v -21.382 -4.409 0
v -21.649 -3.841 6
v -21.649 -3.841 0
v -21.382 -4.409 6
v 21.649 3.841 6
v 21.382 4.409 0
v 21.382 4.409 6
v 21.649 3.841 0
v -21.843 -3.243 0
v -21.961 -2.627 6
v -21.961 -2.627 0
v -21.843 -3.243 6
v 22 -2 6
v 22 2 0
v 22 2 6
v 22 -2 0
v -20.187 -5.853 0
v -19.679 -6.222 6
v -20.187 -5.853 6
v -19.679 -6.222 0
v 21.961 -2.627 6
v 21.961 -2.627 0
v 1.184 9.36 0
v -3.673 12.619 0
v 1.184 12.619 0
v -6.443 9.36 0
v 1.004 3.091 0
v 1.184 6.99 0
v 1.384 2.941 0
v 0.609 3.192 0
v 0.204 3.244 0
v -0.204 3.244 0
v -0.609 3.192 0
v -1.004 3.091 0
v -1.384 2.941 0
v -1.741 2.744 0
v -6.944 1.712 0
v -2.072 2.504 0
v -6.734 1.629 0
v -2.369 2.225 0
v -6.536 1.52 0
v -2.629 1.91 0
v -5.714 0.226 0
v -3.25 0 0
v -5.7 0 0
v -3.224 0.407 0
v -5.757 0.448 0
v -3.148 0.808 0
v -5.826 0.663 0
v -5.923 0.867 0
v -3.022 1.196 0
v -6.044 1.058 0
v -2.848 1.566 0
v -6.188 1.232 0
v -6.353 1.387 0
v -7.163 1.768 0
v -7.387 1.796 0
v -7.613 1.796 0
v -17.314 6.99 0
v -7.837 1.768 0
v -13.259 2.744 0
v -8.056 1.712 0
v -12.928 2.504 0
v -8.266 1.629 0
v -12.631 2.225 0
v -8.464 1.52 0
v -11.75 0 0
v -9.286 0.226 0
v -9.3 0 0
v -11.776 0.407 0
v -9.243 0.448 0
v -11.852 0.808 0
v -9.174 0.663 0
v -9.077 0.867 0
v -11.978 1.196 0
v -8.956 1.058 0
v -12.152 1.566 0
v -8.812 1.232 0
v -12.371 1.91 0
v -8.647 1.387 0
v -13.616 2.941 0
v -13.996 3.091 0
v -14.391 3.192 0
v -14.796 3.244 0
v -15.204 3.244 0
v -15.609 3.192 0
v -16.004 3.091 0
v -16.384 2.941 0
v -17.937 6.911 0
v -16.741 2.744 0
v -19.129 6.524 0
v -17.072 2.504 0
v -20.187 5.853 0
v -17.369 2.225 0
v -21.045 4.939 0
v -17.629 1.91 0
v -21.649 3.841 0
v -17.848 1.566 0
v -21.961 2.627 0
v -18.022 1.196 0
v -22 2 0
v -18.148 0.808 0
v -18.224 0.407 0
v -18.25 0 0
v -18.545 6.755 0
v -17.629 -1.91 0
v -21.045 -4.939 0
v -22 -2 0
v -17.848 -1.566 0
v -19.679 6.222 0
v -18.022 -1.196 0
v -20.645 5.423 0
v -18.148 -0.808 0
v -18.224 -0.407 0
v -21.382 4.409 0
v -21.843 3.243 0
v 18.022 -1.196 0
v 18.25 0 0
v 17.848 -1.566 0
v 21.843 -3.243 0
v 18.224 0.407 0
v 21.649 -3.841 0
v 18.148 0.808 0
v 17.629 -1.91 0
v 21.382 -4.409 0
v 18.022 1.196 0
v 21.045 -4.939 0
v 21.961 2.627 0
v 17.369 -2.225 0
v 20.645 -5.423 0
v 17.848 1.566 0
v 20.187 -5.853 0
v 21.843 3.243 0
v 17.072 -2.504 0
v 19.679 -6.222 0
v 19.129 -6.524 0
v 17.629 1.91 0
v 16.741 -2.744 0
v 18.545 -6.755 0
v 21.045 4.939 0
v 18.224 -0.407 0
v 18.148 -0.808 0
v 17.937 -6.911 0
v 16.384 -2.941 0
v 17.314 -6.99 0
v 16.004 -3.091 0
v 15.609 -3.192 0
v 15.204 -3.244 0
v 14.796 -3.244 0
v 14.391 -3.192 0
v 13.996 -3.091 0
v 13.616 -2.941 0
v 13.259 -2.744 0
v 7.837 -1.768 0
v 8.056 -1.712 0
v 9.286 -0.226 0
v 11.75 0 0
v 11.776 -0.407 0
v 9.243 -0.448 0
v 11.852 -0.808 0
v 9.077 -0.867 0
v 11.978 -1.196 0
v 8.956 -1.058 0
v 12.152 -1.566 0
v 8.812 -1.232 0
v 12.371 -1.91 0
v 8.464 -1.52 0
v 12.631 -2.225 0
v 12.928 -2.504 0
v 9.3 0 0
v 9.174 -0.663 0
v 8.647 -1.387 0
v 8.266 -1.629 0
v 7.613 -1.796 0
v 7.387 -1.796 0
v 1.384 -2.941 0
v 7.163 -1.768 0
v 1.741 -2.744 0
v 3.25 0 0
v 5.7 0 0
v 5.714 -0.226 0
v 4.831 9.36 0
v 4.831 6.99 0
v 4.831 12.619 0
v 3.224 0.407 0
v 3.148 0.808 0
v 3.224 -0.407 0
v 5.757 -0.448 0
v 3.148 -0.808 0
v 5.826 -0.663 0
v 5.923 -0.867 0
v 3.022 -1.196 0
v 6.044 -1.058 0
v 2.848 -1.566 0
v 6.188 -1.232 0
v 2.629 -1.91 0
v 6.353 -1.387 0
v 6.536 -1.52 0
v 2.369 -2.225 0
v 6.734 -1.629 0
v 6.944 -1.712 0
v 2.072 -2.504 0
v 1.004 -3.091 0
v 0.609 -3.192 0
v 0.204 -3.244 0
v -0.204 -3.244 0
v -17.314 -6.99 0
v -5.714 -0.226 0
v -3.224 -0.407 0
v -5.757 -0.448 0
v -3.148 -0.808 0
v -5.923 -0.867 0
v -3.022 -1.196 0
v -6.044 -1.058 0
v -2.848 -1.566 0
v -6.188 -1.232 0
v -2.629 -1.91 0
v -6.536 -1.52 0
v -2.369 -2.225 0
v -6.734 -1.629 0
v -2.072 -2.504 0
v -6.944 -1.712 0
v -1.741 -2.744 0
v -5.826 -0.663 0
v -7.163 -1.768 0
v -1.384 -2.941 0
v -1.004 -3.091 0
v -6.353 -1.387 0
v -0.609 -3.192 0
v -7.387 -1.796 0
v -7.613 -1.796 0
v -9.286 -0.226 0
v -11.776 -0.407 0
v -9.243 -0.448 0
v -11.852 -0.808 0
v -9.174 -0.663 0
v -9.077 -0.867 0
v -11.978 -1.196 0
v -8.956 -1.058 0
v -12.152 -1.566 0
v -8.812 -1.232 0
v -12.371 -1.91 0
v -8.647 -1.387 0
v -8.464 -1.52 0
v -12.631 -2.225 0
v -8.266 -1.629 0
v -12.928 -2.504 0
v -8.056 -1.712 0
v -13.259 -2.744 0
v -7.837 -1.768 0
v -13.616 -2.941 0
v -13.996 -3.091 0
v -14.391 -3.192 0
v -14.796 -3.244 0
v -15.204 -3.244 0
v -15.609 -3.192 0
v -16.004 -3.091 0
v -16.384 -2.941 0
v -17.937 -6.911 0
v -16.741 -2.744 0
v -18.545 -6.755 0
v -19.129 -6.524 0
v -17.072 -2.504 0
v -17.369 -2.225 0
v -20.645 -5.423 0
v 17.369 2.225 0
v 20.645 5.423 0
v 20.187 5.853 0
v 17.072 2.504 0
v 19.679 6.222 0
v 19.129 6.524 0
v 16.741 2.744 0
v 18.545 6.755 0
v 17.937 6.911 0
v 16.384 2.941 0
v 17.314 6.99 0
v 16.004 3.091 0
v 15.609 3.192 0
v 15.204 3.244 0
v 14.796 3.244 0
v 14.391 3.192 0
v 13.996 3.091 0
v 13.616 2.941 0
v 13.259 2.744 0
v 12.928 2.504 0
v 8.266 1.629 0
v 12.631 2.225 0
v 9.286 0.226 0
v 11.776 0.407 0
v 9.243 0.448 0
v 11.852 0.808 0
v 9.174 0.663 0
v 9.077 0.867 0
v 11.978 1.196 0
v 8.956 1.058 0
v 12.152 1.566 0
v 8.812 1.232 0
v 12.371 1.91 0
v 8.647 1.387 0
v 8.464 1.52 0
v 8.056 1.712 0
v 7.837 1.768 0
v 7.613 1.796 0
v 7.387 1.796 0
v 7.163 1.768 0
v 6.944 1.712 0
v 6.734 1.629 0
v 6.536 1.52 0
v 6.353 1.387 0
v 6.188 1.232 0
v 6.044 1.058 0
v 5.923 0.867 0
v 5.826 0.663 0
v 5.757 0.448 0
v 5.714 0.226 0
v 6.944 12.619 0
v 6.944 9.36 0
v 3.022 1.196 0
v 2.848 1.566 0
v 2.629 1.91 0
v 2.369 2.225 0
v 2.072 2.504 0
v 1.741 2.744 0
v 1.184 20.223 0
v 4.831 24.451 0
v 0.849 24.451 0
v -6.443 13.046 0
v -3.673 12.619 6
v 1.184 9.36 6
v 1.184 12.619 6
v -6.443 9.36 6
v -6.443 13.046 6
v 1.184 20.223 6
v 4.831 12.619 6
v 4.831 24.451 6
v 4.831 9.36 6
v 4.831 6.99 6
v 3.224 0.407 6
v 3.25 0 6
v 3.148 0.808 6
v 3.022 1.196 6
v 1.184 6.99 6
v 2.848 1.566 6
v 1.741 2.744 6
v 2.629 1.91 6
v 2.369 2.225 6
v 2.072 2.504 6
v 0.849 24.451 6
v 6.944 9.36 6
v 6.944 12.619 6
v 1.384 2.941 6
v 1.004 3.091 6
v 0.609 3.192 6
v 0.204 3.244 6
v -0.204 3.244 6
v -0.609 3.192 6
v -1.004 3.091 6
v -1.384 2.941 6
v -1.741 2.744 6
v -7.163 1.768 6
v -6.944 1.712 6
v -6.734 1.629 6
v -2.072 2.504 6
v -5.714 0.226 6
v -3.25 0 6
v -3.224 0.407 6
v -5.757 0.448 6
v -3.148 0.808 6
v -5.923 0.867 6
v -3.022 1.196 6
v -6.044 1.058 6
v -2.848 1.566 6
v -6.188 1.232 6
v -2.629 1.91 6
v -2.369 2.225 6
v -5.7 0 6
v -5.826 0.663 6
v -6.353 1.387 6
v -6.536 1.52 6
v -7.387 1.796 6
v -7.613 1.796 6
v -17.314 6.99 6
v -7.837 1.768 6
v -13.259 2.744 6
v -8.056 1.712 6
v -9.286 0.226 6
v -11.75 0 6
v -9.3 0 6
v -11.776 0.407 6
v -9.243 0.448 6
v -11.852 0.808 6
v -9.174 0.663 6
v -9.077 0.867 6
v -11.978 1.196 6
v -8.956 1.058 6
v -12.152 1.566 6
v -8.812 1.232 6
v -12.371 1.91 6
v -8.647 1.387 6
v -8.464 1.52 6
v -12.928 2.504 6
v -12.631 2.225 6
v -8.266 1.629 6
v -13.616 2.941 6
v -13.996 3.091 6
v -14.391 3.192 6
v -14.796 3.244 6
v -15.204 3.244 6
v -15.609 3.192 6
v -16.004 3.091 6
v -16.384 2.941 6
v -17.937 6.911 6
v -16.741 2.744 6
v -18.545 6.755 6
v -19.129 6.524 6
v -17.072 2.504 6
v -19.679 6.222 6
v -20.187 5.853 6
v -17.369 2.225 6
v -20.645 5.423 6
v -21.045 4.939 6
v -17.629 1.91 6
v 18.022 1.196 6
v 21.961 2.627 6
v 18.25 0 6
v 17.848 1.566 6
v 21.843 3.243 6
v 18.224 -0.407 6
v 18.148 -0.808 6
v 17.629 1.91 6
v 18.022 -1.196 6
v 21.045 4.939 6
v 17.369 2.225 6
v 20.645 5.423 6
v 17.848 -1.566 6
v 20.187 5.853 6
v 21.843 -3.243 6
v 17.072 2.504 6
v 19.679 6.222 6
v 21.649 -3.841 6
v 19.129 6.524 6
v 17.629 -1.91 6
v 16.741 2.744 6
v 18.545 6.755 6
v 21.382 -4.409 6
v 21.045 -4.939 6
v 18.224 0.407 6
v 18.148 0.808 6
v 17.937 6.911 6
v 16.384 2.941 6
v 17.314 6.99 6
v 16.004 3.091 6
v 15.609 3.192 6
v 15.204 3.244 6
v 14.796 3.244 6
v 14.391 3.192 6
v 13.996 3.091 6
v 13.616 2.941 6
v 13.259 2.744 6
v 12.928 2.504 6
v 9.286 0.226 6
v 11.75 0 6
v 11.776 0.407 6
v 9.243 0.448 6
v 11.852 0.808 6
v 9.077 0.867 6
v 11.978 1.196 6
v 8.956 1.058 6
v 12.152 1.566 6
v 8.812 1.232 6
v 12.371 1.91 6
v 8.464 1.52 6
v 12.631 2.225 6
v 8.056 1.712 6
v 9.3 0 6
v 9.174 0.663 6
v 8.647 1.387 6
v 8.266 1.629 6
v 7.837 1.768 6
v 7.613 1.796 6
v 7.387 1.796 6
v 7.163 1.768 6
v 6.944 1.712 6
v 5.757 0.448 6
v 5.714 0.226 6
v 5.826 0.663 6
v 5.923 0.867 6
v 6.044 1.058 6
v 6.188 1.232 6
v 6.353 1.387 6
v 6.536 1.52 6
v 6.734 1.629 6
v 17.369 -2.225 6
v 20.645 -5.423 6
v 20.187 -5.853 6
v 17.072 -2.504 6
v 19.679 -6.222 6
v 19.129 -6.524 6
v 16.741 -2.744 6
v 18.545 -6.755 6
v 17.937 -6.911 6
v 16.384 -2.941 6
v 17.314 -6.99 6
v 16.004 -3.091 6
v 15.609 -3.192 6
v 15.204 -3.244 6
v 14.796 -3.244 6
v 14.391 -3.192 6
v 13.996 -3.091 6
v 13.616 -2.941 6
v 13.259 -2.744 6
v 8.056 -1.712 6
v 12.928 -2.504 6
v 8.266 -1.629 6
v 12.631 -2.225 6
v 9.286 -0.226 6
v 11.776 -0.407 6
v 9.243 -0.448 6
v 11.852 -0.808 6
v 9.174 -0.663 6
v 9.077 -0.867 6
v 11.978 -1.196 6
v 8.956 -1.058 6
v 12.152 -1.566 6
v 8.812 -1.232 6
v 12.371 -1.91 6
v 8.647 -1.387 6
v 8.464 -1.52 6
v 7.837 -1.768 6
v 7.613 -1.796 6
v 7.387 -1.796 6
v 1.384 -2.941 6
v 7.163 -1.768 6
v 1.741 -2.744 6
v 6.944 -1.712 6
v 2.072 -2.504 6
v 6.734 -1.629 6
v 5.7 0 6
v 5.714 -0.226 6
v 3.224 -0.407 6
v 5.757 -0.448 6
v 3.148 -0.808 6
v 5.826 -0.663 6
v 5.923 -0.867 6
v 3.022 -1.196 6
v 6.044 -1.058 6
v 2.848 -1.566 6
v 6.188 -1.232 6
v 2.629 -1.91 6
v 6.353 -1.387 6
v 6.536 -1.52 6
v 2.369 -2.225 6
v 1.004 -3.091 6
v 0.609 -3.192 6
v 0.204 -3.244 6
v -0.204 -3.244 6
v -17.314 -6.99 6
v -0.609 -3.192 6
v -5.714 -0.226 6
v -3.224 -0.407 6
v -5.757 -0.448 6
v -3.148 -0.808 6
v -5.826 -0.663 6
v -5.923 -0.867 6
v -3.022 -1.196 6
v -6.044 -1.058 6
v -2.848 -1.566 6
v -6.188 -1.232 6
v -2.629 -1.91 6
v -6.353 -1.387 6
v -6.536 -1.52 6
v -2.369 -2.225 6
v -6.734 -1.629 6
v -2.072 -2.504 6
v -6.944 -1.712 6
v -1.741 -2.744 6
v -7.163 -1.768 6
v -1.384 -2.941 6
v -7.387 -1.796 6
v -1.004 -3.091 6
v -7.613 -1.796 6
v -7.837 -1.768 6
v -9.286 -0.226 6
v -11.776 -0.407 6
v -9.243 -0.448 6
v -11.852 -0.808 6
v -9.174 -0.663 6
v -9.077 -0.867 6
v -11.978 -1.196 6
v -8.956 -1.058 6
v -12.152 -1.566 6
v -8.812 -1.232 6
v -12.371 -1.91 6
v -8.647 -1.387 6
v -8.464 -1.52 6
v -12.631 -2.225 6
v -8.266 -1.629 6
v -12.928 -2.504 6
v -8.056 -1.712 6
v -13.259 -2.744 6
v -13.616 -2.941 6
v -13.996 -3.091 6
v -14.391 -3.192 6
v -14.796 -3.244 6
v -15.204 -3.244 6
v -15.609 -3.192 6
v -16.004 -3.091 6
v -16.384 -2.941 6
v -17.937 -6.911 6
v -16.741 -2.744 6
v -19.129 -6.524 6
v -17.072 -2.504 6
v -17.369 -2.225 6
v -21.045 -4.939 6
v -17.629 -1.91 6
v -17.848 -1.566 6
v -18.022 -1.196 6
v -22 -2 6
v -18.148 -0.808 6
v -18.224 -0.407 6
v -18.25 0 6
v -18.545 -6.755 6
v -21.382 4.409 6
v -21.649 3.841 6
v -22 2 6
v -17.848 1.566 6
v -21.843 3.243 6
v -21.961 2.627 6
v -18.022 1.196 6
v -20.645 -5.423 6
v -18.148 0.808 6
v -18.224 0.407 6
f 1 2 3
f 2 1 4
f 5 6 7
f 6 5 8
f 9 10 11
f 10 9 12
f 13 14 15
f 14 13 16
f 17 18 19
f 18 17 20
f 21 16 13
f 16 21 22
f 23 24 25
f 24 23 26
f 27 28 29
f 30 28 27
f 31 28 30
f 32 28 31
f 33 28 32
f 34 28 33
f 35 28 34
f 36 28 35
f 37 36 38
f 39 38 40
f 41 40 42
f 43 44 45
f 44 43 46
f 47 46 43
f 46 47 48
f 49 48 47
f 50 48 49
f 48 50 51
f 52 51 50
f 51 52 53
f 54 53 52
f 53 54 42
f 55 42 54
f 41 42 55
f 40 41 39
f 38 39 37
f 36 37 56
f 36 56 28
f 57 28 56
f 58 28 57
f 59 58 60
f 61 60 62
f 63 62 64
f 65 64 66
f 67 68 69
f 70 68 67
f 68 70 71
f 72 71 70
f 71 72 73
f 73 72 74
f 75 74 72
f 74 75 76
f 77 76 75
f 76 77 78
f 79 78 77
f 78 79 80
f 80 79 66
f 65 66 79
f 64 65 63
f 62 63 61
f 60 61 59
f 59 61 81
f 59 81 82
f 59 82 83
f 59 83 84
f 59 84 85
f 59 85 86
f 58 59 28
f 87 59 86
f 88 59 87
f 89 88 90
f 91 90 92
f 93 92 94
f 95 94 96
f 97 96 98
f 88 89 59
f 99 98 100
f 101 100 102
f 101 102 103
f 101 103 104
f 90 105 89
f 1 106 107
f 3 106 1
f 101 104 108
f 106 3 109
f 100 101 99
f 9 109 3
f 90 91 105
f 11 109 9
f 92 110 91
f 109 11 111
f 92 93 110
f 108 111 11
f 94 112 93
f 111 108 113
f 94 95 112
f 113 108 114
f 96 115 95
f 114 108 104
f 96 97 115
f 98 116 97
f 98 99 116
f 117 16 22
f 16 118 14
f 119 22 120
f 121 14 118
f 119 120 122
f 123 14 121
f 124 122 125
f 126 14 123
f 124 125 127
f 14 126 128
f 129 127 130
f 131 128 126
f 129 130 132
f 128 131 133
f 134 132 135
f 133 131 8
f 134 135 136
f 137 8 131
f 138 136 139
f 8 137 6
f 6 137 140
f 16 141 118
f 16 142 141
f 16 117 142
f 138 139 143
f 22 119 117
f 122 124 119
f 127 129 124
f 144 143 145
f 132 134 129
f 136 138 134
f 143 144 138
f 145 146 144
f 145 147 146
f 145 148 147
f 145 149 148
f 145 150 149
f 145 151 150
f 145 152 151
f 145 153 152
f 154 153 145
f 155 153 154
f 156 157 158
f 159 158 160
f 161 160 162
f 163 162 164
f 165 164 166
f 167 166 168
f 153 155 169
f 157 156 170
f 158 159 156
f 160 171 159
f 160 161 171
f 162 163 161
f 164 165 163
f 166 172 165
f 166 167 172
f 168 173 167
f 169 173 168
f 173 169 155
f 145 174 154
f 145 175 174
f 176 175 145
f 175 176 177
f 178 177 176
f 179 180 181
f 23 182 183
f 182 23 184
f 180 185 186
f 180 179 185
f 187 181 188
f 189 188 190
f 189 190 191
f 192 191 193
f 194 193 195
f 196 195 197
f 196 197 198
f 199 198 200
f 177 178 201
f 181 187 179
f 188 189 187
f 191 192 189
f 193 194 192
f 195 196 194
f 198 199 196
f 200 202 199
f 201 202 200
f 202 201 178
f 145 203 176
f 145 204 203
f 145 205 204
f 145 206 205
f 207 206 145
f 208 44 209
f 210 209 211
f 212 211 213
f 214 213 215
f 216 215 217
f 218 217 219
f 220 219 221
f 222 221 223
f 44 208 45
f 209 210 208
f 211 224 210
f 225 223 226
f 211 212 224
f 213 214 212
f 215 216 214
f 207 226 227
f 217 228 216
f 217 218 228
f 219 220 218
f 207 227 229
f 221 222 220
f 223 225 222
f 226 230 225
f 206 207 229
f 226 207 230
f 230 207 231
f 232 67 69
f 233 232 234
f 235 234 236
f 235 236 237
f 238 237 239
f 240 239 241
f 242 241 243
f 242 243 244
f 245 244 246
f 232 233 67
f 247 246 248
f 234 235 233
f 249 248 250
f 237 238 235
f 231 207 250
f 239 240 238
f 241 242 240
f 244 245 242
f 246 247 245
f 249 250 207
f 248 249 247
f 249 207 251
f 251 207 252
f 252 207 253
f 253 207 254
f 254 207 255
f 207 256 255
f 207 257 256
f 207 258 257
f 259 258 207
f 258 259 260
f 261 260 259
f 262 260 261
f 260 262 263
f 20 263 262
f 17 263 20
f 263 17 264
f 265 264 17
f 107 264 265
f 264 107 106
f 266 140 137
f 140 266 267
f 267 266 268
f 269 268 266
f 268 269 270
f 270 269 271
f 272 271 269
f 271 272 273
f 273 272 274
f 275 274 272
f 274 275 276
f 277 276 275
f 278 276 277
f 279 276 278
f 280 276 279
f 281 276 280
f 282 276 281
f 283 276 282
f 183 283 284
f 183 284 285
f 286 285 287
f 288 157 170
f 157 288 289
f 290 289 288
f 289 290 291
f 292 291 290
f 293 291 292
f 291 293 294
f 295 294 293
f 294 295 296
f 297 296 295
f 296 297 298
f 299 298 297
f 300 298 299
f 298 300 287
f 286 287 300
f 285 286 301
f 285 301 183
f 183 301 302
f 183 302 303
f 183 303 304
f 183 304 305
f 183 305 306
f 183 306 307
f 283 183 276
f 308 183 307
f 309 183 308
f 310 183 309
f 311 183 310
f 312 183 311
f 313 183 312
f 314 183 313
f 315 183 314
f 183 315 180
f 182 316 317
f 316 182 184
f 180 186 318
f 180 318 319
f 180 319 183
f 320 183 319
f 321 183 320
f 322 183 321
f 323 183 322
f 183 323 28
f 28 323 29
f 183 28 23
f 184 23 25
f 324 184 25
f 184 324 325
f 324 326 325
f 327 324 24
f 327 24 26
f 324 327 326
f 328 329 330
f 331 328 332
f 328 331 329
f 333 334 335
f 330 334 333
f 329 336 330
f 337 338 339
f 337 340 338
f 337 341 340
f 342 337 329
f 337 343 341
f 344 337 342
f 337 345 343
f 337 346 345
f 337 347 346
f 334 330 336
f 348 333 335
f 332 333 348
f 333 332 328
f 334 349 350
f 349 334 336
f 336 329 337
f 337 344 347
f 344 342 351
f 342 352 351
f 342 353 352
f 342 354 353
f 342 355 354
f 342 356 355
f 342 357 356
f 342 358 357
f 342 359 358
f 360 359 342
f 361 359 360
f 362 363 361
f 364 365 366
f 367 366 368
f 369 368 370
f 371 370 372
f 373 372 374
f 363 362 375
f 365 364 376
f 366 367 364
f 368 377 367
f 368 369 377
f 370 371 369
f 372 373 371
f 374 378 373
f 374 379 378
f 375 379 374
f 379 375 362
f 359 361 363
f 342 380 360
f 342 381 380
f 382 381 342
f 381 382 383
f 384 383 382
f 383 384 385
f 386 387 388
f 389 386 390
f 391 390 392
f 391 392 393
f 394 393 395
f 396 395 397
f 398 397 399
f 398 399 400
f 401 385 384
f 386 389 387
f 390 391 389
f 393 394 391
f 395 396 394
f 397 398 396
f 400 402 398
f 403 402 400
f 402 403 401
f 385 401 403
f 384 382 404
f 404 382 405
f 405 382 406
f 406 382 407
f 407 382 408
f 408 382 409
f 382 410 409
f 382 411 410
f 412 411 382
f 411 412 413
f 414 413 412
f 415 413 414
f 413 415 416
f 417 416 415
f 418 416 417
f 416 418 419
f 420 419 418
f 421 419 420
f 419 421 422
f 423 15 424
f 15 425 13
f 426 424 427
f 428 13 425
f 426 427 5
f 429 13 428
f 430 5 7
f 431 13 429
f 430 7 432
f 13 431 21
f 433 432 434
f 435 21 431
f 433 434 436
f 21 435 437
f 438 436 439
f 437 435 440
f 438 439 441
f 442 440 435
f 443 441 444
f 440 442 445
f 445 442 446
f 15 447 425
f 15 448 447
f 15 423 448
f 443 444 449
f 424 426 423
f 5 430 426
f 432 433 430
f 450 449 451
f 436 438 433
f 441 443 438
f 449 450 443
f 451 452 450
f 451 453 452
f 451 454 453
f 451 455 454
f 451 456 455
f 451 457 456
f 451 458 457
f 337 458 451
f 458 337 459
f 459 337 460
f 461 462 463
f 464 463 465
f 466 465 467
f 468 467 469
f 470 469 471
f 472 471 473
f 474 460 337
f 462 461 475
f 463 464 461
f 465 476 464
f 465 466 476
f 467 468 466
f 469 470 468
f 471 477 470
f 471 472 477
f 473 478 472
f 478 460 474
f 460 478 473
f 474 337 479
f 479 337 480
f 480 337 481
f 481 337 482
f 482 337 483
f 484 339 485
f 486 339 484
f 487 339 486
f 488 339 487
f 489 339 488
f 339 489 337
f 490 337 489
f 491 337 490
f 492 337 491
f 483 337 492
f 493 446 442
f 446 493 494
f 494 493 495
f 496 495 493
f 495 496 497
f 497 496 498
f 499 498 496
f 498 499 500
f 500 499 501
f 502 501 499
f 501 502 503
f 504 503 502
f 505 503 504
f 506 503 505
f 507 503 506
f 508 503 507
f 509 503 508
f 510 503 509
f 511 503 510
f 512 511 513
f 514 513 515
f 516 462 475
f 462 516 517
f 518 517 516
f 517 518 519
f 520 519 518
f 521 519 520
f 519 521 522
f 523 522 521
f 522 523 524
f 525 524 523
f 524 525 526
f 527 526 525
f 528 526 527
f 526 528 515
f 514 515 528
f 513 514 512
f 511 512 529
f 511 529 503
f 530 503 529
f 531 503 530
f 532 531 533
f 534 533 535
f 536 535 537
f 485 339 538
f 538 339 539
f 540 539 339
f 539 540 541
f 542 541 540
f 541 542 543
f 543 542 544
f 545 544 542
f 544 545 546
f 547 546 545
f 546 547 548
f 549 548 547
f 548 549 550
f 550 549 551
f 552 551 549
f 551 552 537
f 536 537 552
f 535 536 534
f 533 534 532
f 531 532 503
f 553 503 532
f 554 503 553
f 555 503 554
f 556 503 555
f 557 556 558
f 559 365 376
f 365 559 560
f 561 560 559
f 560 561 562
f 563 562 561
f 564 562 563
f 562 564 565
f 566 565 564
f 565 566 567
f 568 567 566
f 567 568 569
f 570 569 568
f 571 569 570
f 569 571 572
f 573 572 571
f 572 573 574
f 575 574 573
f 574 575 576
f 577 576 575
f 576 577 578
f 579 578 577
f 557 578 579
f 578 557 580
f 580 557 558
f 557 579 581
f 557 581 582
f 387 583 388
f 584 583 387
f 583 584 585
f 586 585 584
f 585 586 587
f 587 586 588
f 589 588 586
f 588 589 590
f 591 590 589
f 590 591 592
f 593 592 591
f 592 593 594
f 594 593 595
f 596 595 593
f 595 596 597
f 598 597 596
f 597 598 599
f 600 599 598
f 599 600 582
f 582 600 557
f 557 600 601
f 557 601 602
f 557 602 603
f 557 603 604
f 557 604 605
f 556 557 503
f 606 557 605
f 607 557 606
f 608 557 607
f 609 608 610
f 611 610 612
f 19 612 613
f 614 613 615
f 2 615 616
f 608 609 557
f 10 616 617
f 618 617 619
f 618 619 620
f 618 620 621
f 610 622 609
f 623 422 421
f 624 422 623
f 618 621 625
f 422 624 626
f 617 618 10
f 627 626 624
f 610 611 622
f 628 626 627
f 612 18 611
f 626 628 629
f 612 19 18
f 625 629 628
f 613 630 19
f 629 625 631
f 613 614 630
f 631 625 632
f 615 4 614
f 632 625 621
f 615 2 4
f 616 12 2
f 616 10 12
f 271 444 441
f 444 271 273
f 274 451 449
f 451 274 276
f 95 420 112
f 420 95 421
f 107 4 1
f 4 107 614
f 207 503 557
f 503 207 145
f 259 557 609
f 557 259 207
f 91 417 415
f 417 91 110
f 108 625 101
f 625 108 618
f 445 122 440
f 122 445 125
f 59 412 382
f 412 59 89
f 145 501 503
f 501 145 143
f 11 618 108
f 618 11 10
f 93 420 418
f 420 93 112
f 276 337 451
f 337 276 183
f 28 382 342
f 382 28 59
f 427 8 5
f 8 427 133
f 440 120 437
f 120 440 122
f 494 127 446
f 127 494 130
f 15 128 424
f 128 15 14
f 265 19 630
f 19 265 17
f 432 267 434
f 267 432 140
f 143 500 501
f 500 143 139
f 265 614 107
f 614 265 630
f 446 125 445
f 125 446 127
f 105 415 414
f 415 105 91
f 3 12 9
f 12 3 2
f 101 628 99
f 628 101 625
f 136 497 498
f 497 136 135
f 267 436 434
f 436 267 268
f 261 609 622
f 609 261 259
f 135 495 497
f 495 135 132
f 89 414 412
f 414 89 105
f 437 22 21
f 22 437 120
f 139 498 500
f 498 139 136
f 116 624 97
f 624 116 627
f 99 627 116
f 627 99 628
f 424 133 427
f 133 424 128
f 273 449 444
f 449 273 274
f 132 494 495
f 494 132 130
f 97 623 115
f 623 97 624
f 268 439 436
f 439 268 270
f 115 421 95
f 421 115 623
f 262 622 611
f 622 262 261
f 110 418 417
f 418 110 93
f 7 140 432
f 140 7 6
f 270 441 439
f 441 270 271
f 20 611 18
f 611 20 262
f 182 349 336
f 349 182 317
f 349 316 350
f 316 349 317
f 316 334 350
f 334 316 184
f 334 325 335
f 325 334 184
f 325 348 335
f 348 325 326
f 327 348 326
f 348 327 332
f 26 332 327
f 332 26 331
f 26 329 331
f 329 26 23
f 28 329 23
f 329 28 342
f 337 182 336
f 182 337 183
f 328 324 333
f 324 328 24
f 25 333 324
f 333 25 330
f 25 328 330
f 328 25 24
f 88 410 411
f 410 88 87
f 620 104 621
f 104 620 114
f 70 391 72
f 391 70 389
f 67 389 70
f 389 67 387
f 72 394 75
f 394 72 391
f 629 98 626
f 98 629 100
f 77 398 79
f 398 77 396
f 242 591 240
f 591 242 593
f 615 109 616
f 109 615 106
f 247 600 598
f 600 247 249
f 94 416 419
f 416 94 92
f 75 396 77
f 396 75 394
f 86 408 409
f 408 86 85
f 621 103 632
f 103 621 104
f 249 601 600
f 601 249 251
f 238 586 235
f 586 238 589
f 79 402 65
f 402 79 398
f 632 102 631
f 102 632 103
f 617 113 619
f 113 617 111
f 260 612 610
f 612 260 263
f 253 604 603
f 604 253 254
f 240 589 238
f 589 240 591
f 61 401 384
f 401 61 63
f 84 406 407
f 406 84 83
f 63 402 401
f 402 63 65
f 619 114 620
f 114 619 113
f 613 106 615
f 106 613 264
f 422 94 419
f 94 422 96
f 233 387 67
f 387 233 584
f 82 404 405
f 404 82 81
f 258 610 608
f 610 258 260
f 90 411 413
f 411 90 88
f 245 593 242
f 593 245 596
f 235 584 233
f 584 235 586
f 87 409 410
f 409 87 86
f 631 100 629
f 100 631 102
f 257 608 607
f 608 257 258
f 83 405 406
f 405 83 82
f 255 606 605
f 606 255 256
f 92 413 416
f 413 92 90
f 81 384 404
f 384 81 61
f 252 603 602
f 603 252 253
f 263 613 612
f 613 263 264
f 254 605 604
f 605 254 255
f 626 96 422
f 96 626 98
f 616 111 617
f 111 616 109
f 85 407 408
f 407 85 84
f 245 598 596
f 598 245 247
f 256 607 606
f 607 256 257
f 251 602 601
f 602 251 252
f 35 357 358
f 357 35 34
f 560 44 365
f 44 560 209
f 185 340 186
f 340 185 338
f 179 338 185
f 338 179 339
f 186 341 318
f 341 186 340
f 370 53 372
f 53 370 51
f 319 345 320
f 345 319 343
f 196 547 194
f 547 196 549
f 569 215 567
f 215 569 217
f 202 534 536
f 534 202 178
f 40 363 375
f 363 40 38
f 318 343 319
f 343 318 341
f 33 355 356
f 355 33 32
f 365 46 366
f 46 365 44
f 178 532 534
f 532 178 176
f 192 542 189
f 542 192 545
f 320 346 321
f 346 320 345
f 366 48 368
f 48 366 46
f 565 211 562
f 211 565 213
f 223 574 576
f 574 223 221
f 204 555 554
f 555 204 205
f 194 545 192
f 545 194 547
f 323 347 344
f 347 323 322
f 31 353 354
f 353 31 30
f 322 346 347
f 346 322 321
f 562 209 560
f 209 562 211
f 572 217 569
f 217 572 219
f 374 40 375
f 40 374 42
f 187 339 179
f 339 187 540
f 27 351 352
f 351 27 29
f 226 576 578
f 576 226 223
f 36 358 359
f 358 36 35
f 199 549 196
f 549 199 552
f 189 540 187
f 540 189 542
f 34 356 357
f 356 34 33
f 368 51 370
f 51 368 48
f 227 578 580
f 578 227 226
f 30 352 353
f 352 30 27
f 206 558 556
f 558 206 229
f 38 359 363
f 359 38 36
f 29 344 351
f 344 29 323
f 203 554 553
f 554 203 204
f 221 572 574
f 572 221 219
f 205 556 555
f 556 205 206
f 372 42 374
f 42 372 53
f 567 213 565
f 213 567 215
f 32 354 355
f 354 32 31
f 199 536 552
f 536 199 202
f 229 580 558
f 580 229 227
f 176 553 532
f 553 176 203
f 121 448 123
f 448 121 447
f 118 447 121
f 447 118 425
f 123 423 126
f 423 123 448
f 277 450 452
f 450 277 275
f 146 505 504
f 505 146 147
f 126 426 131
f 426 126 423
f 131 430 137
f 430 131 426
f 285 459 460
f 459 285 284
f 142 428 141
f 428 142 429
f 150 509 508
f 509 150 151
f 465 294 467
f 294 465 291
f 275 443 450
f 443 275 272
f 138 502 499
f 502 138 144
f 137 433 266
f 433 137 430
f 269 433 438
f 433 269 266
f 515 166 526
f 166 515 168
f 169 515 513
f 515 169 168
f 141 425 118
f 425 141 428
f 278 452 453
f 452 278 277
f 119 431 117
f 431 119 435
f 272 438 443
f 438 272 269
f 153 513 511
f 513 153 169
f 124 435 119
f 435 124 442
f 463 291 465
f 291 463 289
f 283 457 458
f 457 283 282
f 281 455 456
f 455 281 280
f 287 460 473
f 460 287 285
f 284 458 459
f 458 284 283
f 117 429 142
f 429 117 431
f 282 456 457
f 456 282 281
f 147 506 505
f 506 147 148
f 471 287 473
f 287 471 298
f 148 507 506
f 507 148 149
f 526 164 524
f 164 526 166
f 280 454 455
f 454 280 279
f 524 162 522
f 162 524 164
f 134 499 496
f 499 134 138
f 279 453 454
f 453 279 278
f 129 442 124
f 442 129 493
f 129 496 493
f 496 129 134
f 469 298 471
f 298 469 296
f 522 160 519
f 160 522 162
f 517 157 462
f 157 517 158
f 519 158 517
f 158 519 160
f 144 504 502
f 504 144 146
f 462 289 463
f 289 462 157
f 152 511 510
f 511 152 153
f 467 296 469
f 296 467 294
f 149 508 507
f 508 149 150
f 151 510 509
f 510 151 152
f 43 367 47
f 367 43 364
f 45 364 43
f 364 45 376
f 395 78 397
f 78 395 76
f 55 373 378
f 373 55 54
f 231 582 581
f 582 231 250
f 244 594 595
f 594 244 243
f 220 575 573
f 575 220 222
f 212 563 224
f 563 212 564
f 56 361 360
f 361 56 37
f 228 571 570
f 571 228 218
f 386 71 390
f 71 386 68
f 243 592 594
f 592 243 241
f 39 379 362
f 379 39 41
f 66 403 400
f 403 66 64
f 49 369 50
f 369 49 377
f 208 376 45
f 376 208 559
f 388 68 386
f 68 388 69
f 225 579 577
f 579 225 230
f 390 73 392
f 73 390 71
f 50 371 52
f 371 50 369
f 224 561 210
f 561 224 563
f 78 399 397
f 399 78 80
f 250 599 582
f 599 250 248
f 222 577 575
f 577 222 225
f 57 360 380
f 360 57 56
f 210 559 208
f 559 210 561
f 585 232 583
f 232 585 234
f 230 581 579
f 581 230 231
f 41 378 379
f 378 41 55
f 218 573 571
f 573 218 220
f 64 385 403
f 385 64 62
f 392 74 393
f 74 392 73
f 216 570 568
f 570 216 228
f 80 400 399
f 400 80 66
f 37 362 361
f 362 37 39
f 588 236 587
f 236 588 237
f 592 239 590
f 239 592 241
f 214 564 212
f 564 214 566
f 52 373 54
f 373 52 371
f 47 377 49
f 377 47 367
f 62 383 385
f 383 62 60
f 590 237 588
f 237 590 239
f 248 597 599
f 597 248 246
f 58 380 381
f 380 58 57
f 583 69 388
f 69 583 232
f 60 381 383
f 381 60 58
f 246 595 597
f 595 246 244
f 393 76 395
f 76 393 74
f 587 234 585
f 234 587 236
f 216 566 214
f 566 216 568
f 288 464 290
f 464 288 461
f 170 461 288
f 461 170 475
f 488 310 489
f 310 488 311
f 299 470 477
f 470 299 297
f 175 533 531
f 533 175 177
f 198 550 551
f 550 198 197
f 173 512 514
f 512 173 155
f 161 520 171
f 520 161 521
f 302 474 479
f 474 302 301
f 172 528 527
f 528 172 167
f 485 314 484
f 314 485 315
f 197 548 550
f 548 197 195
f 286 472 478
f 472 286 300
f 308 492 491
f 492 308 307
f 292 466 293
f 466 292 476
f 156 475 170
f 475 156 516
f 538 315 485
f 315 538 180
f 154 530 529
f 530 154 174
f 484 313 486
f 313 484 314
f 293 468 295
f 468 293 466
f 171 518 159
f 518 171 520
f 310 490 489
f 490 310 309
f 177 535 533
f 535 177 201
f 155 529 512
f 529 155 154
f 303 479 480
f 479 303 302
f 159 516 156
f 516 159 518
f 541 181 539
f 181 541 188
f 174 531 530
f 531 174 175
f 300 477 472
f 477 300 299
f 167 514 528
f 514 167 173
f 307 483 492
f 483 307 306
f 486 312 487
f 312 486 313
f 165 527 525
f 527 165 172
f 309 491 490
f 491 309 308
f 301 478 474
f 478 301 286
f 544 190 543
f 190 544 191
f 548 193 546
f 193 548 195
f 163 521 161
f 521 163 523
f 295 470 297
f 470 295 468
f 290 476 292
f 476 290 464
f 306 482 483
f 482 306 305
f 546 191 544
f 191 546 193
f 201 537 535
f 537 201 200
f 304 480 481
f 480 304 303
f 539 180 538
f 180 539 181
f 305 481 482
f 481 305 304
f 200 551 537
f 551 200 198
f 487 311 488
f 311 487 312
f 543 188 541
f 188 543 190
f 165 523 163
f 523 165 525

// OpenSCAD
$fn = 50;


difference() {
	union() {
		hull() {
			translate(v = [-17.0000000000, 2.0000000000, 0]) {
				cylinder(h = 6, r = 5);
			}
			translate(v = [17.0000000000, 2.0000000000, 0]) {
				cylinder(h = 6, r = 5);
			}
			translate(v = [-17.0000000000, -2.0000000000, 0]) {
				cylinder(h = 6, r = 5);
			}
			translate(v = [17.0000000000, -2.0000000000, 0]) {
				cylinder(h = 6, r = 5);
			}
		}
		translate(v = [0, 24, 0]) {
			linear_extrude(height = 6) {
				text(font = "DejaVu Sans Mono:style=Bold", halign = "center", size = 19.0000000000, text = "4", valign = "top");
			}
		}
	}
	union() {
		translate(v = [-15.0000000000, 0.0000000000, 0]) {
			translate(v = [0, 0, -100]) {
				cylinder(h = 200, r = 3.2500000000);
			}
		}
		translate(v = [0, 0, -100]) {
			cylinder(h = 200, r = 3.2500000000);
		}
		translate(v = [15.0000000000, 0.0000000000, 0]) {
			translate(v = [0, 0, -100]) {
				cylinder(h = 200, r = 3.2500000000);
			}
		}
		translate(v = [-15.0000000000, 0.0000000000, 0]) {
			translate(v = [0, 0, -100]) {
				cylinder(h = 200, r = 1.8000000000);
			}
		}
		translate(v = [-7.5000000000, 0.0000000000, 0]) {
			translate(v = [0, 0, -100]) {
				cylinder(h = 200, r = 1.8000000000);
			}
		}
		translate(v = [0, 0, -100]) {
			cylinder(h = 200, r = 1.8000000000);
		}
		translate(v = [7.5000000000, 0.0000000000, 0]) {
			translate(v = [0, 0, -100]) {
				cylinder(h = 200, r = 1.8000000000);
			}
		}
		translate(v = [15.0000000000, 0.0000000000, 0]) {
			translate(v = [0, 0, -100]) {
				cylinder(h = 200, r = 1.8000000000);
			}
		}
	}
}
